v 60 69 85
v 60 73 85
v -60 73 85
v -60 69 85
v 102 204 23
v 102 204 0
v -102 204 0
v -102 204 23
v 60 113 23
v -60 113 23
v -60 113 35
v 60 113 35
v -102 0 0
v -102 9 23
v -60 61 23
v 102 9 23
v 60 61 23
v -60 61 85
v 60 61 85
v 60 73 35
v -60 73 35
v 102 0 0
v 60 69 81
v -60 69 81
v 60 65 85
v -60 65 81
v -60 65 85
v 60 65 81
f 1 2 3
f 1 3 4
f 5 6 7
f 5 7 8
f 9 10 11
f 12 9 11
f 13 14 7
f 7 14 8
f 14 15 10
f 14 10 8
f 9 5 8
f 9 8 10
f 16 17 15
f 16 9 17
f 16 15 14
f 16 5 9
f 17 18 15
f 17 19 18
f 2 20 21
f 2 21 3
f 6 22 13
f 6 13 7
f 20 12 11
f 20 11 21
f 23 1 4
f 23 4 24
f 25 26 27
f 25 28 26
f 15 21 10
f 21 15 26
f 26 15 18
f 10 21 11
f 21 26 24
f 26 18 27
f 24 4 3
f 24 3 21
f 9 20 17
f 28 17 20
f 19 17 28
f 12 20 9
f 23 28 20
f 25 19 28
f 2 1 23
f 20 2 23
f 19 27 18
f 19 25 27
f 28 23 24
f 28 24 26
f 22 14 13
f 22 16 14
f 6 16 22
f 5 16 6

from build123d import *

# Parameters (mm, degrees)
F1_DEPTH = 102
F2_DEPTH = 60


with BuildPart() as f1:
    # F0 (on Right) → F1 (new body, symmetric)
    with BuildSketch(Plane.YZ):
        Polygon((9, 23), (0, 0), (204, 0), (204, 23), (113, 23), (61, 23), align=None)
    extrude(amount=F1_DEPTH, both=True)

    # F0 (on Right) → F2 (join, symmetric)
    with BuildSketch(Plane.YZ):
        Polygon((61, 85), (61, 23), (113, 23), (113, 35), (73, 35), (73, 85), (69, 85), (69, 81), (65, 81), (65, 85), align=None)
    extrude(amount=F2_DEPTH, both=True)


solid = f1.part
